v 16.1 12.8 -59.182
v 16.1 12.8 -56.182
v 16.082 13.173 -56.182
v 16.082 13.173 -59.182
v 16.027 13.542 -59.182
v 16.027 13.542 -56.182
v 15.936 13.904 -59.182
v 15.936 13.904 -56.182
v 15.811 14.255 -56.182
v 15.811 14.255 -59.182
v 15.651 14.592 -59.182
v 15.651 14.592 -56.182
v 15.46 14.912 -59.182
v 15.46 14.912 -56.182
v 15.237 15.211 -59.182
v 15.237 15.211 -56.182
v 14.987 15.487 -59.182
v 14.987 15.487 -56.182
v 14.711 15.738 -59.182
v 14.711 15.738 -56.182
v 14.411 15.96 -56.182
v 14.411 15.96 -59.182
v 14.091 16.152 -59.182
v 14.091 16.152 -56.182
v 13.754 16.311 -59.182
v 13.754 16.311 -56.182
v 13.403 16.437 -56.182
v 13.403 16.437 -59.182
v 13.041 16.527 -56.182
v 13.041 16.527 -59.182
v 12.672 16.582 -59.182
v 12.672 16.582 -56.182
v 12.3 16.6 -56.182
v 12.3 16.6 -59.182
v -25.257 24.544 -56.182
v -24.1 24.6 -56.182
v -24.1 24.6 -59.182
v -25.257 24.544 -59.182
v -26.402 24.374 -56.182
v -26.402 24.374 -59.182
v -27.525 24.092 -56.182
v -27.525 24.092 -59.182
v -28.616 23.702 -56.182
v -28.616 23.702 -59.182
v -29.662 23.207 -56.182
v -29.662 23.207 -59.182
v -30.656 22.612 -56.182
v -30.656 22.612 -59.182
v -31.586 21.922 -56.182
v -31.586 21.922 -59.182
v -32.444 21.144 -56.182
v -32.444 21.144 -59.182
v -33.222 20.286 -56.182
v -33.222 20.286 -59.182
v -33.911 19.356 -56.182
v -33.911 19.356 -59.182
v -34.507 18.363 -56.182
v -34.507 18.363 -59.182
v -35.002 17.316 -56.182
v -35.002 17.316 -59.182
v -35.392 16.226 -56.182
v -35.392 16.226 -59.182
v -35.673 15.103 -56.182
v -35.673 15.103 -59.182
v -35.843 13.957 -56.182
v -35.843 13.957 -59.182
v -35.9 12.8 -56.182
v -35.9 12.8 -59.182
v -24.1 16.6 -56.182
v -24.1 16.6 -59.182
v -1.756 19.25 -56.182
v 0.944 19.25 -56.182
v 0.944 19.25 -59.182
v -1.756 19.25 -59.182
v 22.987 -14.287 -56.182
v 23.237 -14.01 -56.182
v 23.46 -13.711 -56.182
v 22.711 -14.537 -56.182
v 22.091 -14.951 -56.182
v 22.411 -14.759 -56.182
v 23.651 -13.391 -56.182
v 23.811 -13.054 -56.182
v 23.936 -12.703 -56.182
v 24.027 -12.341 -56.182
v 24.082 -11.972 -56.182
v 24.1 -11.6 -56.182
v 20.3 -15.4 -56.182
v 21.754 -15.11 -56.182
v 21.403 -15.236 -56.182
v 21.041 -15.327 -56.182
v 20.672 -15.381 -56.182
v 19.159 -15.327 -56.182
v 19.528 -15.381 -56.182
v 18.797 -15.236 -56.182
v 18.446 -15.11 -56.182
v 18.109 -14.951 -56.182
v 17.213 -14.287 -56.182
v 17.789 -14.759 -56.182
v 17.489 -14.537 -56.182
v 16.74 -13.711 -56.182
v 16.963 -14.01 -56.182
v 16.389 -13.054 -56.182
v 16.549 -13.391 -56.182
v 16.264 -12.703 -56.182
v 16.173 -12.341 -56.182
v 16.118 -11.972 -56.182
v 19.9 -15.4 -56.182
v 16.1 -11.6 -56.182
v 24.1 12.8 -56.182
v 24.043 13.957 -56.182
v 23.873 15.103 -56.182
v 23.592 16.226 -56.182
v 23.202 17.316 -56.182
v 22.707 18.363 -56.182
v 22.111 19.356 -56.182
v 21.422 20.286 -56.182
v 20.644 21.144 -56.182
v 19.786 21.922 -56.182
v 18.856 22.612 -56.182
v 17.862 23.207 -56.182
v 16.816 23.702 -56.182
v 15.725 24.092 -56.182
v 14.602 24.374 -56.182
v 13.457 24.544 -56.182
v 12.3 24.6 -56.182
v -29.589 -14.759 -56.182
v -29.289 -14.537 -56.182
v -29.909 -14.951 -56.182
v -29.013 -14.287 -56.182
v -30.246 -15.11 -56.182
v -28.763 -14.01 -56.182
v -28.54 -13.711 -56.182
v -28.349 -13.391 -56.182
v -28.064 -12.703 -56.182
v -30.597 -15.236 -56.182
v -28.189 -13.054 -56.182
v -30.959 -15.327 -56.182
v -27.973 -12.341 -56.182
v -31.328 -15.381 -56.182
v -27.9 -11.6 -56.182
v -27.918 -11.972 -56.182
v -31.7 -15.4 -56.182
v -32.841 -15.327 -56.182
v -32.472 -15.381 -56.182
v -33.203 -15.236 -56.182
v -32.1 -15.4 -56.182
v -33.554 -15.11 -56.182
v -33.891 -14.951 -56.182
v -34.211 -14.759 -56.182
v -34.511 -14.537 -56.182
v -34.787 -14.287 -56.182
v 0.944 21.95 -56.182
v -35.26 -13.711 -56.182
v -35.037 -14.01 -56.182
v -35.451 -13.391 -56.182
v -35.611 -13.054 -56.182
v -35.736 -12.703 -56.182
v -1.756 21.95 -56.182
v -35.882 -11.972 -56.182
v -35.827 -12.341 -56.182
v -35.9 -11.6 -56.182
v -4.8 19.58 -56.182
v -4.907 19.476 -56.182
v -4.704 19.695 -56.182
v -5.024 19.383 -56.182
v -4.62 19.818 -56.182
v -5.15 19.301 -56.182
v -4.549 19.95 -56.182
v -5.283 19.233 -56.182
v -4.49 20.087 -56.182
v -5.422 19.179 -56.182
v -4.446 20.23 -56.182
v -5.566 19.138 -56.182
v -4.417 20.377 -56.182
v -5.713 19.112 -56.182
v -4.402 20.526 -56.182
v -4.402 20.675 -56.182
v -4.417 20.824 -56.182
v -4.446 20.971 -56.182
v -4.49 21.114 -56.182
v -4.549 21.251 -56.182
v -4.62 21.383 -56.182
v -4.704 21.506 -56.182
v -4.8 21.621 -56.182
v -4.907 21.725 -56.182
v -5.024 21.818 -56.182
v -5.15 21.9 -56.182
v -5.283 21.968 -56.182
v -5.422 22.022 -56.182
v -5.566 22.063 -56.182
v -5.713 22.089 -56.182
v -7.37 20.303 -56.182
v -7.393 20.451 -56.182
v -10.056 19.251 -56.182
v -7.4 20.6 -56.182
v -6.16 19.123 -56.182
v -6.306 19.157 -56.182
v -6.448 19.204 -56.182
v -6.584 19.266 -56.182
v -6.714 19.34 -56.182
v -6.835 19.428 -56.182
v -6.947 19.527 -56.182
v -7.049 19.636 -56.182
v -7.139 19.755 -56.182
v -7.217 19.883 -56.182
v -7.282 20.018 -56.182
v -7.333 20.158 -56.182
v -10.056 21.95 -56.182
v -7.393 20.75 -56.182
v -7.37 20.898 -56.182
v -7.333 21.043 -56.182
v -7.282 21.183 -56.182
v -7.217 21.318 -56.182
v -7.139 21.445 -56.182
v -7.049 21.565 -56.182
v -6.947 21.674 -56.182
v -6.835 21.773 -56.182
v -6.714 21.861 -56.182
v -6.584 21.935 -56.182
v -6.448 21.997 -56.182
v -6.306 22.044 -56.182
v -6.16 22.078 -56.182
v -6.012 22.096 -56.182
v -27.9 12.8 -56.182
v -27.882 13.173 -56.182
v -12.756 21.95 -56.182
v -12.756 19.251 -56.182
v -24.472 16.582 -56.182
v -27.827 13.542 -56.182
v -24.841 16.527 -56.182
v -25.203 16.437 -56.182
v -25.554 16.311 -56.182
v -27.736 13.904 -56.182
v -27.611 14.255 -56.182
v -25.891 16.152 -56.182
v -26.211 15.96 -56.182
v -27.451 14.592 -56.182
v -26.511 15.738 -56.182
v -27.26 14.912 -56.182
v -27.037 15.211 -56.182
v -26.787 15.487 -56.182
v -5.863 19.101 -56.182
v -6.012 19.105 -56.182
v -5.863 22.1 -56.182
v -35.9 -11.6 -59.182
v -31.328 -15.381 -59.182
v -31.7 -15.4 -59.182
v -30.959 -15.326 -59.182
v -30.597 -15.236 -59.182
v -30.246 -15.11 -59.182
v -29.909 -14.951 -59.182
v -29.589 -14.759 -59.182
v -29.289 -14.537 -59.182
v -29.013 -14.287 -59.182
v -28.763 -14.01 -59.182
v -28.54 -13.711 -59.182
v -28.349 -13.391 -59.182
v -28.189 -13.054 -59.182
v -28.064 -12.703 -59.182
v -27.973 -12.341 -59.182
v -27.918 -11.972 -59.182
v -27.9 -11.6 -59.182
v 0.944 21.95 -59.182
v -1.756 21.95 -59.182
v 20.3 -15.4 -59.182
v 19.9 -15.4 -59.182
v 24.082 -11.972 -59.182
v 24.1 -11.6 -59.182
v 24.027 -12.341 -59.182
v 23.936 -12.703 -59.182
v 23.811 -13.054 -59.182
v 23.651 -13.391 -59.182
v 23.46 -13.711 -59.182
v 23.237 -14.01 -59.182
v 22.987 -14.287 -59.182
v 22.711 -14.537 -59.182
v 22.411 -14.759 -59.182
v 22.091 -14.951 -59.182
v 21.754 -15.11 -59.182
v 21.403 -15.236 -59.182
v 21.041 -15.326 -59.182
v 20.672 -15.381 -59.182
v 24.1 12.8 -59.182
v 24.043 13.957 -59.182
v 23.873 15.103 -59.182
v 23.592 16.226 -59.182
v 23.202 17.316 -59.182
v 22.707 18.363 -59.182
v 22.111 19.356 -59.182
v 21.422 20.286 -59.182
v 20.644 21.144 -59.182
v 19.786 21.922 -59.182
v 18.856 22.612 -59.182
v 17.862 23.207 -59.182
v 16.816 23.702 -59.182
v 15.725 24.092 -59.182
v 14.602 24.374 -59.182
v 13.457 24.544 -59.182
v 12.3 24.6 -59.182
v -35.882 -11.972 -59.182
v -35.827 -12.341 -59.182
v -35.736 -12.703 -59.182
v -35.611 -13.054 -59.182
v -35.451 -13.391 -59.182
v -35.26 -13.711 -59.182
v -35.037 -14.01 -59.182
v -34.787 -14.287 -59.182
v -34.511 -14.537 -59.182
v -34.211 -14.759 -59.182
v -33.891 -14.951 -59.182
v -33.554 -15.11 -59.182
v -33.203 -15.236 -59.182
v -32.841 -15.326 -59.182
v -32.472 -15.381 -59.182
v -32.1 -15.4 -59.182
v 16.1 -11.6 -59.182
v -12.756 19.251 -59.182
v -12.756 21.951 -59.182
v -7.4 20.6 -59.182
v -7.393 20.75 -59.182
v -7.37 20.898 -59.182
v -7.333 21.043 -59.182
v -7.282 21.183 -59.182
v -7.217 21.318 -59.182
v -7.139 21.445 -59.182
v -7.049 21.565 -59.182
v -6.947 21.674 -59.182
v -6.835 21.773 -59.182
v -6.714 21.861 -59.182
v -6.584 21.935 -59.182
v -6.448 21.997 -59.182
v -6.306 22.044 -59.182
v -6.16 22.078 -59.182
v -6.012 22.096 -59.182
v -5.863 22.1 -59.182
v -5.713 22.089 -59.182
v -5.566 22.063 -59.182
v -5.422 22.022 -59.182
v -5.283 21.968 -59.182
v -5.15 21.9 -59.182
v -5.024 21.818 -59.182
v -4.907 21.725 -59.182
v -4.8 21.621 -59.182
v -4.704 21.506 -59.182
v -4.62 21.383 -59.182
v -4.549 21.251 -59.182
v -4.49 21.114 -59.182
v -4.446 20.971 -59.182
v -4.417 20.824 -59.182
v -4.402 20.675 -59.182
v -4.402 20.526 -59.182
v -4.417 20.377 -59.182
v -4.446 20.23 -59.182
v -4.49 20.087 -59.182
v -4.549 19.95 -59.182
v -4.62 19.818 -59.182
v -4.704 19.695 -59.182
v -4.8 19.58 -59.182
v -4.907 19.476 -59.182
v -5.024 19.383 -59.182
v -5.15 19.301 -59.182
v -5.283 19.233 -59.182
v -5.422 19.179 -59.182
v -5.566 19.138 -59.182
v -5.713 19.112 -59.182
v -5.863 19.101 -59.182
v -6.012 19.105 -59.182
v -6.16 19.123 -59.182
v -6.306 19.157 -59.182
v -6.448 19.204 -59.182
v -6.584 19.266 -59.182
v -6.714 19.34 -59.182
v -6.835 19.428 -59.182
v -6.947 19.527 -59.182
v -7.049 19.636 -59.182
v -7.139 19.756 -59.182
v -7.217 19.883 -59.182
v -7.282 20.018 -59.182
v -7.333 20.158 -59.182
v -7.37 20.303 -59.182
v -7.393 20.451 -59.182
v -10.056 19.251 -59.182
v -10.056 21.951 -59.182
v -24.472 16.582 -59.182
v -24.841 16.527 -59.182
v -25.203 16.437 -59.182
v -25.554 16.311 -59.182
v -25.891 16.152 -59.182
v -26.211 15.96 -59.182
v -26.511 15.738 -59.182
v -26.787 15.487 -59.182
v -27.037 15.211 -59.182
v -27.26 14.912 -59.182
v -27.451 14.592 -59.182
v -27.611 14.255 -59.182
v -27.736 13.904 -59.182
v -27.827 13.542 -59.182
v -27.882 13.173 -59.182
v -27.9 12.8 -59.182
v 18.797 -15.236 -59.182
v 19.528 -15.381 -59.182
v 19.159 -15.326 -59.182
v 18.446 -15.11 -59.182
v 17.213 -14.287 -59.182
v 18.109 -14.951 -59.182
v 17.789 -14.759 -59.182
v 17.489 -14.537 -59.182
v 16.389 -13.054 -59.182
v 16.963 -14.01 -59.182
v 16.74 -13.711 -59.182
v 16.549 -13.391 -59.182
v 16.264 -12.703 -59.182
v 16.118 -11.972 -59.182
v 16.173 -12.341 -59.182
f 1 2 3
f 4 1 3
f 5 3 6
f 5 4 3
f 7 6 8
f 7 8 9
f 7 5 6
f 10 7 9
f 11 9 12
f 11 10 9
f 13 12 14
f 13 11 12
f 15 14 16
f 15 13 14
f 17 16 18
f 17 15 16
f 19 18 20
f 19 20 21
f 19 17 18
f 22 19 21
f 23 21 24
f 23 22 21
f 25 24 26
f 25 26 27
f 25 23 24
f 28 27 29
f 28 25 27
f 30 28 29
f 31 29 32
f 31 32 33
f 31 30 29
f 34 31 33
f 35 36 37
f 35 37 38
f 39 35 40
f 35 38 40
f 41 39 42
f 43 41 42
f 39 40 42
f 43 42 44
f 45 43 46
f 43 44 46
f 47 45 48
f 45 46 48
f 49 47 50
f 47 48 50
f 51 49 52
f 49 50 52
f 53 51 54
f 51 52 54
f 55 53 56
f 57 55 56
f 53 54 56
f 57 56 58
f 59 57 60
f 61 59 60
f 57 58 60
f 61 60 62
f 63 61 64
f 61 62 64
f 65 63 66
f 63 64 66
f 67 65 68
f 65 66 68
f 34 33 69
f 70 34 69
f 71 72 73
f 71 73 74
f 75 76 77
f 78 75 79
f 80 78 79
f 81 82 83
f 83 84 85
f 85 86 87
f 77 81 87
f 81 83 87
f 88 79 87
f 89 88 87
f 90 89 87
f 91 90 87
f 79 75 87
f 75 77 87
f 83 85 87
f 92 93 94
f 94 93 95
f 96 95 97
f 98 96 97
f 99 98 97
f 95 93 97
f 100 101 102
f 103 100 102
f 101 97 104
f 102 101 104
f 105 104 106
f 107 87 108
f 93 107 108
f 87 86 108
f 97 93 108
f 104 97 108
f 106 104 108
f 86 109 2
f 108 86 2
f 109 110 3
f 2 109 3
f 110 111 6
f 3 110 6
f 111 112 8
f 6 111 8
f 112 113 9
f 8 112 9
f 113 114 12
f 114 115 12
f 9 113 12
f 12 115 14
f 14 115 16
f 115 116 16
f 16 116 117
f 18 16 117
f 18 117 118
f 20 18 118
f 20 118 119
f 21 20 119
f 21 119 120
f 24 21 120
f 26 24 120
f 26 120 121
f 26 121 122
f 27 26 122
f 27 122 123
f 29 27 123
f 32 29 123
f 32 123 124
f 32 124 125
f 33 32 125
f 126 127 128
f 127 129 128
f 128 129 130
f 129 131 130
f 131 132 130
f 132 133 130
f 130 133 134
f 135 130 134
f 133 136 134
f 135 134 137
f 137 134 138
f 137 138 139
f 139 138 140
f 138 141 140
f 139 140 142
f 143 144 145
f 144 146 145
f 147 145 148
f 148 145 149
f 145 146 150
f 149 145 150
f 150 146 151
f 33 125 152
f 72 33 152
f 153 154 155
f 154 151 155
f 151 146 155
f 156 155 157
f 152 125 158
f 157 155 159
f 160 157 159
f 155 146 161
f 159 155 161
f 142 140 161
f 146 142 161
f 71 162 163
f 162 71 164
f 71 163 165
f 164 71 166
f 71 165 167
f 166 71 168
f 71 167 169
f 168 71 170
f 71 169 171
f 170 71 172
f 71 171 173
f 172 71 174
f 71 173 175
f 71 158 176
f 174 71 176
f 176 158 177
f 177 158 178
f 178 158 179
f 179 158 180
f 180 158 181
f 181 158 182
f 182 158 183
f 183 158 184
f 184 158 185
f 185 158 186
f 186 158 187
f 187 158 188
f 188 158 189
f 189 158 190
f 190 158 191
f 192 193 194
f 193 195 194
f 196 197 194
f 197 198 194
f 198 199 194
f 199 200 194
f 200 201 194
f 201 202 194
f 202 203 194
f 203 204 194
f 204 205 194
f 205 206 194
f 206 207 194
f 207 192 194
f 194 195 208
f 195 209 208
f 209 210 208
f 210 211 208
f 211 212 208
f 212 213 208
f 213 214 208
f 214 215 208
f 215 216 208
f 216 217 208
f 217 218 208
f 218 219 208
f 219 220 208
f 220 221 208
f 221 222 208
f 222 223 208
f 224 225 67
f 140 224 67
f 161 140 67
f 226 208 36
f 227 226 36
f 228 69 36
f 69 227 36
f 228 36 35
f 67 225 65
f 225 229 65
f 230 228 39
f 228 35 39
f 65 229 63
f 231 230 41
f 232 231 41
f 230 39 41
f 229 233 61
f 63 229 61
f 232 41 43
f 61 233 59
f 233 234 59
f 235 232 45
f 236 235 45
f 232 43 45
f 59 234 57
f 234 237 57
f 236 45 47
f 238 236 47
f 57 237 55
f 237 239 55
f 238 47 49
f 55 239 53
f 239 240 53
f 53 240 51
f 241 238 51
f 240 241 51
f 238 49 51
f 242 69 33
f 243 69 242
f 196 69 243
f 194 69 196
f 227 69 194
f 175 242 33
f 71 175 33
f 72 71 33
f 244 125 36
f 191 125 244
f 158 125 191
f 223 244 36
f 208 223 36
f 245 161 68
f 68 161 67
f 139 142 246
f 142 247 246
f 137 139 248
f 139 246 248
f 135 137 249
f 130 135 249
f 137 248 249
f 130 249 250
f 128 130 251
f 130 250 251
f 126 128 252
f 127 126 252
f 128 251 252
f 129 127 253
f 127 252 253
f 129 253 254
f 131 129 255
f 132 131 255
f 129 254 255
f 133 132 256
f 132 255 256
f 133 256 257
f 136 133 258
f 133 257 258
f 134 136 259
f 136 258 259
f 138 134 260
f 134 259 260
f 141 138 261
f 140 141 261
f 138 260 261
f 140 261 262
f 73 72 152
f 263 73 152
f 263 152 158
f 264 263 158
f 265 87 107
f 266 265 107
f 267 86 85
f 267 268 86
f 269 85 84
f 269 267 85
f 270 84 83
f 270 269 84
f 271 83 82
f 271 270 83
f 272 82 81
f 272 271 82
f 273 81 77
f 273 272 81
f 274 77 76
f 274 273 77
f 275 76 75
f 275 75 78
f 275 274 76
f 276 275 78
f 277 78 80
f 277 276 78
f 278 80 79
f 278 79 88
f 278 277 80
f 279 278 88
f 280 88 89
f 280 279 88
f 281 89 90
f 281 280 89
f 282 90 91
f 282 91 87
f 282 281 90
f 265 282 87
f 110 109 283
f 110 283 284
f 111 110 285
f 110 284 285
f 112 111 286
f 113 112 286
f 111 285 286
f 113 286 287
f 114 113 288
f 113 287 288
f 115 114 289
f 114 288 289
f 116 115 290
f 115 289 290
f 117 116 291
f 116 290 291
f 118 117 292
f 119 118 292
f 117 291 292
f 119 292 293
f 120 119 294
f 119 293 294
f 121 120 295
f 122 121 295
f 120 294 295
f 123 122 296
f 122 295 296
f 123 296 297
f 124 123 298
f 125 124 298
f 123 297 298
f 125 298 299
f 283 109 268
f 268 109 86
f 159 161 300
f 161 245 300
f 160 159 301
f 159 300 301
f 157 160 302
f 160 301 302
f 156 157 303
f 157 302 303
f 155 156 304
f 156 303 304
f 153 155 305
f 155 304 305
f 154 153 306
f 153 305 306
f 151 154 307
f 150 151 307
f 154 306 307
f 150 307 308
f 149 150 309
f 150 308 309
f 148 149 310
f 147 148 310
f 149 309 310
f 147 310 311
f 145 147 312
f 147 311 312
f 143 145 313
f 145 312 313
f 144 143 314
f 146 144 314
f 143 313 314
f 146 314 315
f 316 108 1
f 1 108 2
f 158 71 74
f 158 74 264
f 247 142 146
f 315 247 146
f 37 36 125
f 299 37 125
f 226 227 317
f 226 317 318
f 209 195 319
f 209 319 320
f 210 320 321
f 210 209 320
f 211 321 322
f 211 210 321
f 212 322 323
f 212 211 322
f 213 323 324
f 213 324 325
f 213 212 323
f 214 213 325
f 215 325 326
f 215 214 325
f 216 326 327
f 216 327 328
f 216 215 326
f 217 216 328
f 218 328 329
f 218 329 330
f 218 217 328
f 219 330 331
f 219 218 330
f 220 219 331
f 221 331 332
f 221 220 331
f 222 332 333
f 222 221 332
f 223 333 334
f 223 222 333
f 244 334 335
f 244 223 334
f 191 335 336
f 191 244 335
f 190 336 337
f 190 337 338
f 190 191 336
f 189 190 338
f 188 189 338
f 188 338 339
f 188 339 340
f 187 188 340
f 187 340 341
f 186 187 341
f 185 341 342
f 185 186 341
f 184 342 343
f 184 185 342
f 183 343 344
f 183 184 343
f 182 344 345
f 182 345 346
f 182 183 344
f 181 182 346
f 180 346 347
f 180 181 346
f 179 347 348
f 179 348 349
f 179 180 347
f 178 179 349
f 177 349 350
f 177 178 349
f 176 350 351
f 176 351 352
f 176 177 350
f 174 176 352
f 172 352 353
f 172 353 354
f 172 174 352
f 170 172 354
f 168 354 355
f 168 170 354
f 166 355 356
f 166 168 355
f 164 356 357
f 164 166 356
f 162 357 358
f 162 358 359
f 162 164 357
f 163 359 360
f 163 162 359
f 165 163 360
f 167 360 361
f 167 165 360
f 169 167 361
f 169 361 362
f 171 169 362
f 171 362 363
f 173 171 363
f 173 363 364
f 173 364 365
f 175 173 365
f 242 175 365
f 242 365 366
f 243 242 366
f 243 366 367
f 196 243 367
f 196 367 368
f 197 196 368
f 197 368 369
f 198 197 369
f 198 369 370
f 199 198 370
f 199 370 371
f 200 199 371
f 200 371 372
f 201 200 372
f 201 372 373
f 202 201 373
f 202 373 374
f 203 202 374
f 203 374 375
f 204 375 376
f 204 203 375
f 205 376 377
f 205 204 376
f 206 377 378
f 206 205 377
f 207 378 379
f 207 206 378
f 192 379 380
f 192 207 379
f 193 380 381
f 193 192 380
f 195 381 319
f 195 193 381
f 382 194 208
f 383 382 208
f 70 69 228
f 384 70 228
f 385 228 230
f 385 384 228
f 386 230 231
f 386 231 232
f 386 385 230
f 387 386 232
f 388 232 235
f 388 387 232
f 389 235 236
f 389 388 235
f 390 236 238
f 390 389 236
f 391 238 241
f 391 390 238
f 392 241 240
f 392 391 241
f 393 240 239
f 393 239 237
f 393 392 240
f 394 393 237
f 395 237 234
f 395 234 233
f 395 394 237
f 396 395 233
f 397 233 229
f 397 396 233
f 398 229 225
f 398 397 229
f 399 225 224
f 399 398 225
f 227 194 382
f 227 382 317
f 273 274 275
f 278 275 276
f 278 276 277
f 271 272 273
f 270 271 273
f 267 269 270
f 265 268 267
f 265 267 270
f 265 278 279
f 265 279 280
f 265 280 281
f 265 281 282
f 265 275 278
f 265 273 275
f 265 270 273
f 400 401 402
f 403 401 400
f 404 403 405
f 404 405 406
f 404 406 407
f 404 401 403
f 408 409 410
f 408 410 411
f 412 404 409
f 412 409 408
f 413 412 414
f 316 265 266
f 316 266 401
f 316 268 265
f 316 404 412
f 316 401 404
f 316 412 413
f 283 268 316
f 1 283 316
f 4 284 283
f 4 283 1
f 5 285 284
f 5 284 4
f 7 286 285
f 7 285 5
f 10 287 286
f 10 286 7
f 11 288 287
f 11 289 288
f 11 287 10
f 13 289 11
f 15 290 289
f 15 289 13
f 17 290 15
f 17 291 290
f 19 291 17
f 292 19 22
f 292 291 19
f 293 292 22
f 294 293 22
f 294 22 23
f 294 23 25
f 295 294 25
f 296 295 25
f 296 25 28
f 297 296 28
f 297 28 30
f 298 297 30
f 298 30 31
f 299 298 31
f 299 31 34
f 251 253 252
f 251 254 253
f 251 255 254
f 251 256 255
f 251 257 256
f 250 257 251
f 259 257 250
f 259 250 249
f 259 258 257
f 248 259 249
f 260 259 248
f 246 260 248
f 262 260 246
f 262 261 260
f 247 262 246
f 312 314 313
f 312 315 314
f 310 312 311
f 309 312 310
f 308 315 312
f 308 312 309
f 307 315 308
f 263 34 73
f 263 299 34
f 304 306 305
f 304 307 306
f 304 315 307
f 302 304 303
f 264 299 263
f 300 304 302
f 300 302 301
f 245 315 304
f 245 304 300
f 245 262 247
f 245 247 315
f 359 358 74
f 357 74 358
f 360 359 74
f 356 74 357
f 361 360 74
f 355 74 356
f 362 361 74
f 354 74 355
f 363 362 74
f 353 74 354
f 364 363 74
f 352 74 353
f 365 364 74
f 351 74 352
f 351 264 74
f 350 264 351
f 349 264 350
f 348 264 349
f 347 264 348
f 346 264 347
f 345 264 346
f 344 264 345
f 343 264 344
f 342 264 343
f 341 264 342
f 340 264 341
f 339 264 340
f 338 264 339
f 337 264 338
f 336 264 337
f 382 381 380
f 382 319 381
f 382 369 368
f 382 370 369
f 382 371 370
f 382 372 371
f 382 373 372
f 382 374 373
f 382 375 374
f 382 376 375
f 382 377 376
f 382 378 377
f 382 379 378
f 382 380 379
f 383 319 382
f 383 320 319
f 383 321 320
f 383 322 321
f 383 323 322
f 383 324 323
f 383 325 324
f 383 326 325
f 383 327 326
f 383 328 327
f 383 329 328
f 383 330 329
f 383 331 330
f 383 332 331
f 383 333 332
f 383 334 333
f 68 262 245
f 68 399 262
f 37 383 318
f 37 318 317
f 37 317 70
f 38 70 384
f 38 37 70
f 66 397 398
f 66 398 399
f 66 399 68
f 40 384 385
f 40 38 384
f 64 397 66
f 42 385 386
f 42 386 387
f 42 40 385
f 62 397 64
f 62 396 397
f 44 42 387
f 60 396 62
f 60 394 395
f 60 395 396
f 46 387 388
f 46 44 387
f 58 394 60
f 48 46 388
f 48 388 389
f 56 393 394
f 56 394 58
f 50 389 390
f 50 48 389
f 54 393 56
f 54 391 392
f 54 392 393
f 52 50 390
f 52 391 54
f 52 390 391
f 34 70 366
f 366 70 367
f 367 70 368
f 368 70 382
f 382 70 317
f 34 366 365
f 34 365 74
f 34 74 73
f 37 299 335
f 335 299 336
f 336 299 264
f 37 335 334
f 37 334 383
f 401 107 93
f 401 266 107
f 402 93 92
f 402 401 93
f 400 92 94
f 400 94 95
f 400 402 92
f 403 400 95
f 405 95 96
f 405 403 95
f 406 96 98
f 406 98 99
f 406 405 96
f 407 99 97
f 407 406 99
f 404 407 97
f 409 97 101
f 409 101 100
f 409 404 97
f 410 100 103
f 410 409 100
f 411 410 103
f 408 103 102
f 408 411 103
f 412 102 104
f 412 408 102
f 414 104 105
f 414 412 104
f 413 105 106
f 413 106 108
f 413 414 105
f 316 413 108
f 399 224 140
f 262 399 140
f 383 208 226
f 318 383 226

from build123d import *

# Parameters (mm, degrees)
SKETCH_R                 = 1.5
SKETCH_W                 = 2.700009
SKETCH_H                 = 2.699989
PAD_DEPTH                = 3
FILLET_R                 = 3.8
FILLET001_R              = 11.8
CLONE003_PLACEMENT_ANGLE = 180


with BuildPart() as part:
    # Sketch (on Face9 of Binder004) → Pad (new body)
    with BuildSketch(Plane(origin=(0, 1.8e-05, 2.818036), x_dir=(1, 0, 0), z_dir=(0, -6e-06, -1))):
        Polygon((-30, 24.600493), (-30, -15.399507), (-22, -15.399507), (-22, 16.600493), (22, 16.600493), (22, -15.399507), (30, -15.399507), (30, 24.600493), align=None)
        with Locations((0, 20.600493)):
            Circle(SKETCH_R, mode=Mode.SUBTRACT)
        with Locations((-5.49402, 20.600472)):
            Rectangle(SKETCH_W, SKETCH_H, mode=Mode.SUBTRACT)
        with Locations((5.50598, 20.600513)):
            Rectangle(SKETCH_W, SKETCH_H, mode=Mode.SUBTRACT)
    extrude(amount=PAD_DEPTH)

    # Fillet
    fillet_edges = [part.edges().sort_by_distance(p)[0] for p in [
        (-30, 15.399516, 1.317937),
        (-22, 15.399516, 1.317937),
        (22, 15.399516, 1.317937),
        (30, 15.399516, 1.317937),
        (-22, -16.600484, 1.318144),
        (22, -16.600484, 1.318144),
    ]]
    fillet(fillet_edges, radius=FILLET_R)

    # Fillet001
    fillet001_edges = [part.edges().sort_by_distance(p)[0] for p in [
        (30, -24.600484, 1.318195),
        (-30, -24.600484, 1.318195),
    ]]
    fillet(fillet001_edges, radius=FILLET001_R)


with BuildPart() as part_1:
    # Body placement: moved
    add(part.part.moved(Location((12.1, 0, -69.4))))


with BuildPart() as part_2:
    # Clone003 placement: moved
    add(part_1.part.moved(Location((6.2, 0, 10.4))).rotate(Axis((6.2, 0, 10.4), (0, 0, 1)), CLONE003_PLACEMENT_ANGLE))


solid = part_2.part
